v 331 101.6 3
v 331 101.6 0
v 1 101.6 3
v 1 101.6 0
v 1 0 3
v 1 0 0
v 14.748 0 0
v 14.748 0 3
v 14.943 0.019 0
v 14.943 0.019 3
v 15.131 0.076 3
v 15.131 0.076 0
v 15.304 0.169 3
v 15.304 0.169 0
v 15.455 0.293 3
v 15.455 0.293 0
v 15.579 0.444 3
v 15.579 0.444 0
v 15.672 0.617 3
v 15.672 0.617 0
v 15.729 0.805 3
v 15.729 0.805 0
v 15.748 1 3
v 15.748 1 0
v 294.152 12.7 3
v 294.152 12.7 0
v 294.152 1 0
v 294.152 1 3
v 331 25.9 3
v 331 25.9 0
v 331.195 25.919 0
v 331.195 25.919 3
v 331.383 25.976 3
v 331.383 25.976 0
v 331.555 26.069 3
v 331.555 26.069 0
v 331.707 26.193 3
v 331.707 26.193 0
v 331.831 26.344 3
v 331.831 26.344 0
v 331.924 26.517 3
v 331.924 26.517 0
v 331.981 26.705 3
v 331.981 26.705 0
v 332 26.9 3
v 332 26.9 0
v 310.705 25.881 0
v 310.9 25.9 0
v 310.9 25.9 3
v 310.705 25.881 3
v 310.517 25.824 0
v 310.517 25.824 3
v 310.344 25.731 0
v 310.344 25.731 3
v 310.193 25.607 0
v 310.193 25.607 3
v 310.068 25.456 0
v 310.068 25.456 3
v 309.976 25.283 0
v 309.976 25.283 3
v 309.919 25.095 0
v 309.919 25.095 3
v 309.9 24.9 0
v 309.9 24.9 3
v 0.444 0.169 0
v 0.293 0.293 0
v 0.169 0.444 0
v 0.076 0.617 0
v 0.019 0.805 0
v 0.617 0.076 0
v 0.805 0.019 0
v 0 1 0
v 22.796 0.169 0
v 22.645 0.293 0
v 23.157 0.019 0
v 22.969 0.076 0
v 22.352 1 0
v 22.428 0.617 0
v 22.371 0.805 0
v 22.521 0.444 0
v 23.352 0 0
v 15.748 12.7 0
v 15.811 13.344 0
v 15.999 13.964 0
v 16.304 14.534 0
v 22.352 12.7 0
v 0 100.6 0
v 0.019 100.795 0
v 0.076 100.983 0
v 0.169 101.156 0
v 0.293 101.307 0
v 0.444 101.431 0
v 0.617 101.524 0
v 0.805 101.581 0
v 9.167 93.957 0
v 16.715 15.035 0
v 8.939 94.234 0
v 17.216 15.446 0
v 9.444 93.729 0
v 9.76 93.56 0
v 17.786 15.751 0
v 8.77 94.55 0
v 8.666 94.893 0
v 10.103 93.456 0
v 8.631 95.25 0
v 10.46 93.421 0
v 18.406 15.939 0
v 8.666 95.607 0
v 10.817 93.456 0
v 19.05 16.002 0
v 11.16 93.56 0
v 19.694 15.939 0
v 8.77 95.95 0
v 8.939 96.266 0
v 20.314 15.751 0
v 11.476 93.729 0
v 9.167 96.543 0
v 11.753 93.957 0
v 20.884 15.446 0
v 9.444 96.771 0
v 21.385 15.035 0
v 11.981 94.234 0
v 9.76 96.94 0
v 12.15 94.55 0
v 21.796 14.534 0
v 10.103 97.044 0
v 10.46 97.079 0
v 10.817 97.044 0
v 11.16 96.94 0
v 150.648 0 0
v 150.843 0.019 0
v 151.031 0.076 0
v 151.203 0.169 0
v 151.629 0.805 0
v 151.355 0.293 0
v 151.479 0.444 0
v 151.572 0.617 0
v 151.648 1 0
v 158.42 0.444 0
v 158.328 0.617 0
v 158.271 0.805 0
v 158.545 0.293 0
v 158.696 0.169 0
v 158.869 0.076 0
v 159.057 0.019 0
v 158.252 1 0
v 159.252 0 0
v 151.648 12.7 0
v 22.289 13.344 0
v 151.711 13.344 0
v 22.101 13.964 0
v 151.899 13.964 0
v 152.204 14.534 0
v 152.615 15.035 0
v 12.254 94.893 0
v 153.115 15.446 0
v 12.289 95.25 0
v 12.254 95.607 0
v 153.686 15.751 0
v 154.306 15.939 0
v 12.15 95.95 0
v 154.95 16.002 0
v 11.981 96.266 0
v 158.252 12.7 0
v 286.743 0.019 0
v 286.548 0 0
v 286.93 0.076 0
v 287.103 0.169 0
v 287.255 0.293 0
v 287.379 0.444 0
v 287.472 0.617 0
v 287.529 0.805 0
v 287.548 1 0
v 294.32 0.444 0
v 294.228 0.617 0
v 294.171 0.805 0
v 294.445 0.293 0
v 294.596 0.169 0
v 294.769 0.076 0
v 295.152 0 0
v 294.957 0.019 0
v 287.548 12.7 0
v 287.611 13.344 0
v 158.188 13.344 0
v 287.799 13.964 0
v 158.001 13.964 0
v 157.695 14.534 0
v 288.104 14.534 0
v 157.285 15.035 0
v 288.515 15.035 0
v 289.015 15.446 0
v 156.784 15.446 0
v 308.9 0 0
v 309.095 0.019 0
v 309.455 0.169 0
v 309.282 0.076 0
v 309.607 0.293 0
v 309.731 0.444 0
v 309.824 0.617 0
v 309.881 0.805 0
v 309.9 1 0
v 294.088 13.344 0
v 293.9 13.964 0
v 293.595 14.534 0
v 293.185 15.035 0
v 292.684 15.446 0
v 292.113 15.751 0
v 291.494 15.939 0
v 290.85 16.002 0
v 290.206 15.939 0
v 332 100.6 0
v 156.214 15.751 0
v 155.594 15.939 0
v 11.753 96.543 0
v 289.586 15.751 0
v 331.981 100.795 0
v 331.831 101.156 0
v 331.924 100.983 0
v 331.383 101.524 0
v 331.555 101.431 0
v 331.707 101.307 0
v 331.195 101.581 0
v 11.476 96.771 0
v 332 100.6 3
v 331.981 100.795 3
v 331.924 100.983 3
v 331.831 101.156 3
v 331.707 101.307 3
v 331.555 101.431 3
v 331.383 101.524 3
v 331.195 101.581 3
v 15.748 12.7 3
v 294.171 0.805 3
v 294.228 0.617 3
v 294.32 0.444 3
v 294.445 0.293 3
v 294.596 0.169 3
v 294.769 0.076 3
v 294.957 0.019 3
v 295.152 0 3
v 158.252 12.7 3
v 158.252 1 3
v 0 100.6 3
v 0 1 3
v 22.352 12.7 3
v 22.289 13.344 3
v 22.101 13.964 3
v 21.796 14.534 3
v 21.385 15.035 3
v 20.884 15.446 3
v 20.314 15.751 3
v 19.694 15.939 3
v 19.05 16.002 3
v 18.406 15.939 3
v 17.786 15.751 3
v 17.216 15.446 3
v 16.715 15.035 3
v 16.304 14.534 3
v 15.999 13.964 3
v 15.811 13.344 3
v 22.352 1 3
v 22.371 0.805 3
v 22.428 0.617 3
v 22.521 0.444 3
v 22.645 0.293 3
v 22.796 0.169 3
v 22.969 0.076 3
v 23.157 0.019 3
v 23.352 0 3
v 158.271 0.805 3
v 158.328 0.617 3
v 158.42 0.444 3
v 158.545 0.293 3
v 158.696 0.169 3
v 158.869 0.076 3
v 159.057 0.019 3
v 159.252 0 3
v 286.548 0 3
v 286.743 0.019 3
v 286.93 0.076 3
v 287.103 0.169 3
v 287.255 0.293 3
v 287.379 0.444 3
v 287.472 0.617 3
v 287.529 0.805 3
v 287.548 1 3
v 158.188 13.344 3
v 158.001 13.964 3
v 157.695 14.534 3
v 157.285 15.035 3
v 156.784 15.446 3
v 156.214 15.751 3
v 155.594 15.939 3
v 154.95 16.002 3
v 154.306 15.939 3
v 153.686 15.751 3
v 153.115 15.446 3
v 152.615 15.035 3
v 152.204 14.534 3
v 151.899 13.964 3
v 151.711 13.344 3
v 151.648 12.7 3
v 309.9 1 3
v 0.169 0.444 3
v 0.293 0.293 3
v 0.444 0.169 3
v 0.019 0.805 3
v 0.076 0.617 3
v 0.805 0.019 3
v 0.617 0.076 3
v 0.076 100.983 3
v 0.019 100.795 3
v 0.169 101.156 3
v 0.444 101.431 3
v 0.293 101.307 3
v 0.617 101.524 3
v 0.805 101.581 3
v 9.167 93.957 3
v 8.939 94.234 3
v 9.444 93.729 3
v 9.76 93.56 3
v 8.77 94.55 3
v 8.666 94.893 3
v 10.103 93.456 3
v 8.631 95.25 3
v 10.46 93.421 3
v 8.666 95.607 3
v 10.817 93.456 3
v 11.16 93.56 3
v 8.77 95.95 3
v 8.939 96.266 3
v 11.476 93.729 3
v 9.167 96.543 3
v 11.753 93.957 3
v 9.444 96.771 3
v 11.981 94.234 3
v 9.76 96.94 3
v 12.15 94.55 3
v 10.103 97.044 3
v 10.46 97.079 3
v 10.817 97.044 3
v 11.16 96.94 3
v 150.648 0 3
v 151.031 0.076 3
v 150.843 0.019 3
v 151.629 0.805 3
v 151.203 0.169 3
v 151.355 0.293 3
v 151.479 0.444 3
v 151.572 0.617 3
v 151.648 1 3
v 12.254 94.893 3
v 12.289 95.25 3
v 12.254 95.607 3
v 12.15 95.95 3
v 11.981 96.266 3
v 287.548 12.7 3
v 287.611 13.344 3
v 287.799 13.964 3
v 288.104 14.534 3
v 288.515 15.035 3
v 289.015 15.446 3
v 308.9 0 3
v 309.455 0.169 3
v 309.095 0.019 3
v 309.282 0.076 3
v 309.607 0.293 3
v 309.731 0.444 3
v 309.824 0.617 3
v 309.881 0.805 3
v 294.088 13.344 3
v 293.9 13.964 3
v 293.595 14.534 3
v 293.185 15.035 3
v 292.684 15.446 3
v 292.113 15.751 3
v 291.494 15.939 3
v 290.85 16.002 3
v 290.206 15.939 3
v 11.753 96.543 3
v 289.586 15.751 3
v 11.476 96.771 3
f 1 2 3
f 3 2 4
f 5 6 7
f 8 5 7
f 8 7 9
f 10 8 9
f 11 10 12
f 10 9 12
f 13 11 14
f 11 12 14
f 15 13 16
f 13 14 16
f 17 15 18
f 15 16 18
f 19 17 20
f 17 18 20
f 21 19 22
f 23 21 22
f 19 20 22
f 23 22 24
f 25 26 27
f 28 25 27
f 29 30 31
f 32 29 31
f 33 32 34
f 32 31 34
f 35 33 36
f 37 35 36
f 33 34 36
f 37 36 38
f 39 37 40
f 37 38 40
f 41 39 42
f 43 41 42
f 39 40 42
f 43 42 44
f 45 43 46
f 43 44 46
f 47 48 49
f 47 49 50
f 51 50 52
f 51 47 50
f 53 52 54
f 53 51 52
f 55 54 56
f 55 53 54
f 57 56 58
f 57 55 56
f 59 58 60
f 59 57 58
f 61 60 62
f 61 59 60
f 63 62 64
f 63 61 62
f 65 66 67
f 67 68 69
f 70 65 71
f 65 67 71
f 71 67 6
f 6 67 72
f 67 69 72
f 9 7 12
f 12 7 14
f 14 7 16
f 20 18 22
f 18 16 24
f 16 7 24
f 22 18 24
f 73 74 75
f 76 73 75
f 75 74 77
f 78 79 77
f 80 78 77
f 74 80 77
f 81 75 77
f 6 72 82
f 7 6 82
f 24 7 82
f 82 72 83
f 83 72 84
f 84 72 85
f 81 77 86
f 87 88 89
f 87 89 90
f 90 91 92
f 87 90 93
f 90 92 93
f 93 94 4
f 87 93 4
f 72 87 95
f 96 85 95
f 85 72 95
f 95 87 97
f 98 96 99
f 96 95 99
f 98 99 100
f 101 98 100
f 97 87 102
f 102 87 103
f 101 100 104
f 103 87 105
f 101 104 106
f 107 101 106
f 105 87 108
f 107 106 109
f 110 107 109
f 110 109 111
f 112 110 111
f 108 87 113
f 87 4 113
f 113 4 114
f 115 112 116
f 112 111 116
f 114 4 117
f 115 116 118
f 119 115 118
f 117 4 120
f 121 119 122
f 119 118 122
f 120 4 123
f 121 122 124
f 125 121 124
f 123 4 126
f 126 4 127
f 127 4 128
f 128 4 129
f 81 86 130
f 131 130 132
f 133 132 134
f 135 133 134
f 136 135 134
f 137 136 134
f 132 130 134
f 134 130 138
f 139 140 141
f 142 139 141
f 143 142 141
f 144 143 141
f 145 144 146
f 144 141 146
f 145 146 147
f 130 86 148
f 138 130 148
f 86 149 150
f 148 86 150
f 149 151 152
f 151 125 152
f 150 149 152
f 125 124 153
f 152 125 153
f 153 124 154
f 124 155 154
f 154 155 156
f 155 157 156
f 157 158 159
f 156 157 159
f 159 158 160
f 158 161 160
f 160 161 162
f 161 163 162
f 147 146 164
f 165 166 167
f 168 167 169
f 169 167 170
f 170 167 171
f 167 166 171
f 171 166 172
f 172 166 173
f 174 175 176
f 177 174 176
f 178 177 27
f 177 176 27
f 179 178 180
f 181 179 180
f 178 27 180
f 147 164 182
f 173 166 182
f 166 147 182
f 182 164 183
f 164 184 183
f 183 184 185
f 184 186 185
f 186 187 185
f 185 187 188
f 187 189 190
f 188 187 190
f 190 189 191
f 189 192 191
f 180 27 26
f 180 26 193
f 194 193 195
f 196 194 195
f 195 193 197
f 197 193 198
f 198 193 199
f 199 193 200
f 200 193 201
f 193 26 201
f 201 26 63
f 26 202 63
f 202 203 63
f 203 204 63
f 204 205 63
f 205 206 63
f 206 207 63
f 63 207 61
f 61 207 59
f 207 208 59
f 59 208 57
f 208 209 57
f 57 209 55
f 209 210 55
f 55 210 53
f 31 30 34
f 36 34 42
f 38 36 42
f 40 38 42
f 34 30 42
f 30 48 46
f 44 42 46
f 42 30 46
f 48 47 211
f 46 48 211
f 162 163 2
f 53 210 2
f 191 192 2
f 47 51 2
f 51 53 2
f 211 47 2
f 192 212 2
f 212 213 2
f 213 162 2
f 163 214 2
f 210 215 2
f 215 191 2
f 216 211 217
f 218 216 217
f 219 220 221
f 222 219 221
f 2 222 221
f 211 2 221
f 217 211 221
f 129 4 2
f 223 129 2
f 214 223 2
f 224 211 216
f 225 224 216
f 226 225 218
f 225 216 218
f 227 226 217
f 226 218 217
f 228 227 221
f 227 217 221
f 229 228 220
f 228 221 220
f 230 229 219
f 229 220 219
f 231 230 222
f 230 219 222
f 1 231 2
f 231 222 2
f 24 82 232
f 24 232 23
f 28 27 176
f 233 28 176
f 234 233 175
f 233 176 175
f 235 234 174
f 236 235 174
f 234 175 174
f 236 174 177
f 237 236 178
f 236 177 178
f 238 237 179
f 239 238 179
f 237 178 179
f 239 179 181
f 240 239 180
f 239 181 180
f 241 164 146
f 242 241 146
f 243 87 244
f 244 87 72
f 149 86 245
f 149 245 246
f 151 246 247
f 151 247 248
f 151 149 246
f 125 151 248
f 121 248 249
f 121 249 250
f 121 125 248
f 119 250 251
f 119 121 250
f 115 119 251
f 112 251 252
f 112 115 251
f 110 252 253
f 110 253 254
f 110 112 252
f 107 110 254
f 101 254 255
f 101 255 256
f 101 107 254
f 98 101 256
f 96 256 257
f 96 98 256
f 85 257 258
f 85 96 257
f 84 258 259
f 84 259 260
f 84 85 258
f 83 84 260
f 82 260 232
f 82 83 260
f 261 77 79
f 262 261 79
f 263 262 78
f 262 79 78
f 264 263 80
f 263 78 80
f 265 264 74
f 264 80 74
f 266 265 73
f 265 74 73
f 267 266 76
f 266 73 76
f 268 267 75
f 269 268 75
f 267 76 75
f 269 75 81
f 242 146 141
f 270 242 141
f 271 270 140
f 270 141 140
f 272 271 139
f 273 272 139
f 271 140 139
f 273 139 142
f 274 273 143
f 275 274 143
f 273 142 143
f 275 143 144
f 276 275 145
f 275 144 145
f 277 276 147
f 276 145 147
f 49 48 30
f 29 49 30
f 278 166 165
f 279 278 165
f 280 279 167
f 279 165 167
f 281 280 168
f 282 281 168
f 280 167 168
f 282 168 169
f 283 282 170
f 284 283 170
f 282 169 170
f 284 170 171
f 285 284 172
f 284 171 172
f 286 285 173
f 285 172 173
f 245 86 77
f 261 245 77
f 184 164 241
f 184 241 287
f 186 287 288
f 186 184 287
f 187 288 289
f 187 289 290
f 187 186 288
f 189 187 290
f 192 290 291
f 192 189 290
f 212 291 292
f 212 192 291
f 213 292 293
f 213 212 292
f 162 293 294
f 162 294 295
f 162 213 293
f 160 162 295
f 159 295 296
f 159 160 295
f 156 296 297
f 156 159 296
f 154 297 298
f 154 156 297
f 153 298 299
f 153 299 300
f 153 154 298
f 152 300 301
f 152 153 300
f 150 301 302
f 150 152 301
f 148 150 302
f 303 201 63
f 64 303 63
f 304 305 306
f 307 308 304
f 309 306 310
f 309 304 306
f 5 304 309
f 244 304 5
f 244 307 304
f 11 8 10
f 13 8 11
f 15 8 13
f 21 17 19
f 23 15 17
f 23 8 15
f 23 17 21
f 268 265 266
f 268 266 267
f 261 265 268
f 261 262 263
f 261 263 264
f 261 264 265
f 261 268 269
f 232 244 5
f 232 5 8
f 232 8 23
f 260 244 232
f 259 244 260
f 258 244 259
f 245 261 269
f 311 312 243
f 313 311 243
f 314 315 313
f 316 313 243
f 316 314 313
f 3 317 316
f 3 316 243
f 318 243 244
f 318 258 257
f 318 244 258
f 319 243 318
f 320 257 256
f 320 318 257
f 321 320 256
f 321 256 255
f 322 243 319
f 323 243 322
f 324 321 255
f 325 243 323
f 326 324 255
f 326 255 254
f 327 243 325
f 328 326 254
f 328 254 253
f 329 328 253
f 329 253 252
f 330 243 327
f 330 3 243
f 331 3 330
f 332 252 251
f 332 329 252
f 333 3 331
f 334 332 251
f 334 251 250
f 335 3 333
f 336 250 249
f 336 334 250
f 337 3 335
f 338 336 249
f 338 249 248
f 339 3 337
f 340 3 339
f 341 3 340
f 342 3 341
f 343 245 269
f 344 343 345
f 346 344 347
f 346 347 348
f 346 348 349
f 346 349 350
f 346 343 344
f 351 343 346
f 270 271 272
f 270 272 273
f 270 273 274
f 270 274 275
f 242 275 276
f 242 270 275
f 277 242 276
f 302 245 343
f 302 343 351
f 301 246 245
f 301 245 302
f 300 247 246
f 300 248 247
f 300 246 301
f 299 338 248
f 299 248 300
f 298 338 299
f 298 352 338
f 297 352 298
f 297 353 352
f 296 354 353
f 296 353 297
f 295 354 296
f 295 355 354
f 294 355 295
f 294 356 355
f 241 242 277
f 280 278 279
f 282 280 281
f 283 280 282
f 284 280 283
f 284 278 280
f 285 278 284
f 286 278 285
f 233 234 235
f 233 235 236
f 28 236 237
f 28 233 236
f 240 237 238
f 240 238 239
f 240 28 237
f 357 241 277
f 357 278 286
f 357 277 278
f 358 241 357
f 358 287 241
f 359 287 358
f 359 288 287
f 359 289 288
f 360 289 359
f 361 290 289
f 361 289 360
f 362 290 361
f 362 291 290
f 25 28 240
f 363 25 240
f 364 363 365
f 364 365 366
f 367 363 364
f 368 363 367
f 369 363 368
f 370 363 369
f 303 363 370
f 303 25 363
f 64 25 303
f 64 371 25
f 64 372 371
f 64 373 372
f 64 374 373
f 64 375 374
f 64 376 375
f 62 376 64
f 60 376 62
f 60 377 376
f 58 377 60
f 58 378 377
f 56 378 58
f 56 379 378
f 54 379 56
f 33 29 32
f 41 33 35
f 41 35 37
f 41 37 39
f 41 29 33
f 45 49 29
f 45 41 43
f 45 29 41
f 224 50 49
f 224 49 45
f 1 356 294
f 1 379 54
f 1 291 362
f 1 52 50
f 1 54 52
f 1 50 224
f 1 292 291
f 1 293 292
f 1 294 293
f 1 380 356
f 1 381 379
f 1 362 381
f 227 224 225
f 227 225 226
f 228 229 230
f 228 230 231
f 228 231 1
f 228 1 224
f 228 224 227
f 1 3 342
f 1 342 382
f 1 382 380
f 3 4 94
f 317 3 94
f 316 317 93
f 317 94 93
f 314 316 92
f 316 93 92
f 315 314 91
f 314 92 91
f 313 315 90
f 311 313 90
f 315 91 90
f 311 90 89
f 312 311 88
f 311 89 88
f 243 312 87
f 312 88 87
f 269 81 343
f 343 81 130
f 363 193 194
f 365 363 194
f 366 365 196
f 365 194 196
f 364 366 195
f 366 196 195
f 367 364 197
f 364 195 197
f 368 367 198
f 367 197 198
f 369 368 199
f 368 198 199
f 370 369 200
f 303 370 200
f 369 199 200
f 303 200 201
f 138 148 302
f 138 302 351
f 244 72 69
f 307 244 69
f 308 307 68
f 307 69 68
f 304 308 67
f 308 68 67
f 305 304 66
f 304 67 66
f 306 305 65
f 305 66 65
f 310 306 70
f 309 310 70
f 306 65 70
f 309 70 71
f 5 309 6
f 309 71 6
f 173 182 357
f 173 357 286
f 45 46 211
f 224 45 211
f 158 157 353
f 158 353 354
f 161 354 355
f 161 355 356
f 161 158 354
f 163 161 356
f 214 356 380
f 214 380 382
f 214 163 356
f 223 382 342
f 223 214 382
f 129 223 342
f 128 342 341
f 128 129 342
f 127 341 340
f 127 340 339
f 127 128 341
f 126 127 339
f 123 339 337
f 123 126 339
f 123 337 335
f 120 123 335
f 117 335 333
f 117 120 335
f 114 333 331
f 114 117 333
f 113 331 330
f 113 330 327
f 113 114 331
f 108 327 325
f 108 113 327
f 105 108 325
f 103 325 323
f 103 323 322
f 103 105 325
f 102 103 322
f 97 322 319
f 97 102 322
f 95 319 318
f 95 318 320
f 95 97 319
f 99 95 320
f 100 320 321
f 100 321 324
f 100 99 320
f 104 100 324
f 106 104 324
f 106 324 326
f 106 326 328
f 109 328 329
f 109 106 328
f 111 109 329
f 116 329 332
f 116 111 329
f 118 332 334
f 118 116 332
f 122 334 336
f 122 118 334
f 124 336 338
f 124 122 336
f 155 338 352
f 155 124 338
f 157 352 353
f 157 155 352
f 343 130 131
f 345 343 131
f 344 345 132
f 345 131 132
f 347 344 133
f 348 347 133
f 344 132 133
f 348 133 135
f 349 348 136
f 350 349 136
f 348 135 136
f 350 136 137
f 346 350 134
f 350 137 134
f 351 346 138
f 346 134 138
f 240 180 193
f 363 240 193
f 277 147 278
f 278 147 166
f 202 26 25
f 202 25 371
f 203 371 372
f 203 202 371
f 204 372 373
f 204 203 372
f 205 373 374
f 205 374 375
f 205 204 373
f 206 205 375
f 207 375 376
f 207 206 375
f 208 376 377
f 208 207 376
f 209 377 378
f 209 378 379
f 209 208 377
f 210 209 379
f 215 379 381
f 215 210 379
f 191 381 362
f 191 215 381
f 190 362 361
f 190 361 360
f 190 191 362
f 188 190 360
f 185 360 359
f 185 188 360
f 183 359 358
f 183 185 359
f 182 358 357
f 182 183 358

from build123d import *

# Parameters (mm, degrees)
SKETCH_R  = 1.8288
PAD_DEPTH = 3


with BuildPart() as part:
    # Sketch → Pad (new body)
    with BuildSketch(Plane.XY):
        with BuildLine():
            Line((0, 100.6), (0, 1))
            ThreePointArc((0, 1), (0.292893, 0.292893), (1, 0))
            Line((1, 0), (14.748, 0))
            ThreePointArc((14.748, 0), (15.455107, 0.292893), (15.748, 1))
            Line((15.748, 12.7), (15.748, 1))
            ThreePointArc((22.352, 12.7), (19.05, 16.002), (15.748, 12.7))
            Line((22.352, 12.7), (22.352, 1))
            ThreePointArc((22.352, 1), (22.644893, 0.292893), (23.352, 0))
            Line((23.352, 0), (150.6479, 0))
            ThreePointArc((150.6479, 0), (151.355007, 0.292893), (151.6479, 1))
            Line((151.6479, 12.7), (151.6479, 1))
            ThreePointArc((158.2519, 12.7), (154.9499, 16.002), (151.6479, 12.7))
            Line((158.2519, 12.7), (158.2519, 1))
            ThreePointArc((158.2519, 1), (158.544793, 0.292893), (159.2519, 0))
            Line((159.2519, 0), (286.5478, 0))
            ThreePointArc((286.5478, 0), (287.254907, 0.292893), (287.5478, 1))
            Line((287.5478, 12.7), (287.5478, 1))
            ThreePointArc((294.1518, 12.7), (290.8498, 16.002), (287.5478, 12.7))
            Line((294.1518, 12.7), (294.1518, 1))
            ThreePointArc((294.1518, 1), (294.444693, 0.292893), (295.1518, 0))
            Line((295.1518, 0), (308.8998, 0))
            ThreePointArc((308.8998, 0), (309.606907, 0.292893), (309.8998, 1))
            Line((309.8998, 1), (309.8998, 24.9))
            ThreePointArc((310.8998, 25.9), (310.192693, 25.607107), (309.8998, 24.9))
            Line((310.8998, 25.9), (330.9999, 25.9))
            ThreePointArc((330.9999, 25.9), (331.707007, 26.192893), (331.9999, 26.9))
            Line((331.9999, 26.9), (331.9999, 100.6))
            ThreePointArc((331.9999, 100.6), (331.707007, 101.307107), (330.9999, 101.6))
            Line((330.9999, 101.6), (1, 101.6))
            ThreePointArc((1, 101.6), (0.292893, 101.307107), (0, 100.6))
        make_face()
        with Locations((10.46, 95.25)):
            Circle(SKETCH_R, mode=Mode.SUBTRACT)
    extrude(amount=PAD_DEPTH)


solid = part.part
